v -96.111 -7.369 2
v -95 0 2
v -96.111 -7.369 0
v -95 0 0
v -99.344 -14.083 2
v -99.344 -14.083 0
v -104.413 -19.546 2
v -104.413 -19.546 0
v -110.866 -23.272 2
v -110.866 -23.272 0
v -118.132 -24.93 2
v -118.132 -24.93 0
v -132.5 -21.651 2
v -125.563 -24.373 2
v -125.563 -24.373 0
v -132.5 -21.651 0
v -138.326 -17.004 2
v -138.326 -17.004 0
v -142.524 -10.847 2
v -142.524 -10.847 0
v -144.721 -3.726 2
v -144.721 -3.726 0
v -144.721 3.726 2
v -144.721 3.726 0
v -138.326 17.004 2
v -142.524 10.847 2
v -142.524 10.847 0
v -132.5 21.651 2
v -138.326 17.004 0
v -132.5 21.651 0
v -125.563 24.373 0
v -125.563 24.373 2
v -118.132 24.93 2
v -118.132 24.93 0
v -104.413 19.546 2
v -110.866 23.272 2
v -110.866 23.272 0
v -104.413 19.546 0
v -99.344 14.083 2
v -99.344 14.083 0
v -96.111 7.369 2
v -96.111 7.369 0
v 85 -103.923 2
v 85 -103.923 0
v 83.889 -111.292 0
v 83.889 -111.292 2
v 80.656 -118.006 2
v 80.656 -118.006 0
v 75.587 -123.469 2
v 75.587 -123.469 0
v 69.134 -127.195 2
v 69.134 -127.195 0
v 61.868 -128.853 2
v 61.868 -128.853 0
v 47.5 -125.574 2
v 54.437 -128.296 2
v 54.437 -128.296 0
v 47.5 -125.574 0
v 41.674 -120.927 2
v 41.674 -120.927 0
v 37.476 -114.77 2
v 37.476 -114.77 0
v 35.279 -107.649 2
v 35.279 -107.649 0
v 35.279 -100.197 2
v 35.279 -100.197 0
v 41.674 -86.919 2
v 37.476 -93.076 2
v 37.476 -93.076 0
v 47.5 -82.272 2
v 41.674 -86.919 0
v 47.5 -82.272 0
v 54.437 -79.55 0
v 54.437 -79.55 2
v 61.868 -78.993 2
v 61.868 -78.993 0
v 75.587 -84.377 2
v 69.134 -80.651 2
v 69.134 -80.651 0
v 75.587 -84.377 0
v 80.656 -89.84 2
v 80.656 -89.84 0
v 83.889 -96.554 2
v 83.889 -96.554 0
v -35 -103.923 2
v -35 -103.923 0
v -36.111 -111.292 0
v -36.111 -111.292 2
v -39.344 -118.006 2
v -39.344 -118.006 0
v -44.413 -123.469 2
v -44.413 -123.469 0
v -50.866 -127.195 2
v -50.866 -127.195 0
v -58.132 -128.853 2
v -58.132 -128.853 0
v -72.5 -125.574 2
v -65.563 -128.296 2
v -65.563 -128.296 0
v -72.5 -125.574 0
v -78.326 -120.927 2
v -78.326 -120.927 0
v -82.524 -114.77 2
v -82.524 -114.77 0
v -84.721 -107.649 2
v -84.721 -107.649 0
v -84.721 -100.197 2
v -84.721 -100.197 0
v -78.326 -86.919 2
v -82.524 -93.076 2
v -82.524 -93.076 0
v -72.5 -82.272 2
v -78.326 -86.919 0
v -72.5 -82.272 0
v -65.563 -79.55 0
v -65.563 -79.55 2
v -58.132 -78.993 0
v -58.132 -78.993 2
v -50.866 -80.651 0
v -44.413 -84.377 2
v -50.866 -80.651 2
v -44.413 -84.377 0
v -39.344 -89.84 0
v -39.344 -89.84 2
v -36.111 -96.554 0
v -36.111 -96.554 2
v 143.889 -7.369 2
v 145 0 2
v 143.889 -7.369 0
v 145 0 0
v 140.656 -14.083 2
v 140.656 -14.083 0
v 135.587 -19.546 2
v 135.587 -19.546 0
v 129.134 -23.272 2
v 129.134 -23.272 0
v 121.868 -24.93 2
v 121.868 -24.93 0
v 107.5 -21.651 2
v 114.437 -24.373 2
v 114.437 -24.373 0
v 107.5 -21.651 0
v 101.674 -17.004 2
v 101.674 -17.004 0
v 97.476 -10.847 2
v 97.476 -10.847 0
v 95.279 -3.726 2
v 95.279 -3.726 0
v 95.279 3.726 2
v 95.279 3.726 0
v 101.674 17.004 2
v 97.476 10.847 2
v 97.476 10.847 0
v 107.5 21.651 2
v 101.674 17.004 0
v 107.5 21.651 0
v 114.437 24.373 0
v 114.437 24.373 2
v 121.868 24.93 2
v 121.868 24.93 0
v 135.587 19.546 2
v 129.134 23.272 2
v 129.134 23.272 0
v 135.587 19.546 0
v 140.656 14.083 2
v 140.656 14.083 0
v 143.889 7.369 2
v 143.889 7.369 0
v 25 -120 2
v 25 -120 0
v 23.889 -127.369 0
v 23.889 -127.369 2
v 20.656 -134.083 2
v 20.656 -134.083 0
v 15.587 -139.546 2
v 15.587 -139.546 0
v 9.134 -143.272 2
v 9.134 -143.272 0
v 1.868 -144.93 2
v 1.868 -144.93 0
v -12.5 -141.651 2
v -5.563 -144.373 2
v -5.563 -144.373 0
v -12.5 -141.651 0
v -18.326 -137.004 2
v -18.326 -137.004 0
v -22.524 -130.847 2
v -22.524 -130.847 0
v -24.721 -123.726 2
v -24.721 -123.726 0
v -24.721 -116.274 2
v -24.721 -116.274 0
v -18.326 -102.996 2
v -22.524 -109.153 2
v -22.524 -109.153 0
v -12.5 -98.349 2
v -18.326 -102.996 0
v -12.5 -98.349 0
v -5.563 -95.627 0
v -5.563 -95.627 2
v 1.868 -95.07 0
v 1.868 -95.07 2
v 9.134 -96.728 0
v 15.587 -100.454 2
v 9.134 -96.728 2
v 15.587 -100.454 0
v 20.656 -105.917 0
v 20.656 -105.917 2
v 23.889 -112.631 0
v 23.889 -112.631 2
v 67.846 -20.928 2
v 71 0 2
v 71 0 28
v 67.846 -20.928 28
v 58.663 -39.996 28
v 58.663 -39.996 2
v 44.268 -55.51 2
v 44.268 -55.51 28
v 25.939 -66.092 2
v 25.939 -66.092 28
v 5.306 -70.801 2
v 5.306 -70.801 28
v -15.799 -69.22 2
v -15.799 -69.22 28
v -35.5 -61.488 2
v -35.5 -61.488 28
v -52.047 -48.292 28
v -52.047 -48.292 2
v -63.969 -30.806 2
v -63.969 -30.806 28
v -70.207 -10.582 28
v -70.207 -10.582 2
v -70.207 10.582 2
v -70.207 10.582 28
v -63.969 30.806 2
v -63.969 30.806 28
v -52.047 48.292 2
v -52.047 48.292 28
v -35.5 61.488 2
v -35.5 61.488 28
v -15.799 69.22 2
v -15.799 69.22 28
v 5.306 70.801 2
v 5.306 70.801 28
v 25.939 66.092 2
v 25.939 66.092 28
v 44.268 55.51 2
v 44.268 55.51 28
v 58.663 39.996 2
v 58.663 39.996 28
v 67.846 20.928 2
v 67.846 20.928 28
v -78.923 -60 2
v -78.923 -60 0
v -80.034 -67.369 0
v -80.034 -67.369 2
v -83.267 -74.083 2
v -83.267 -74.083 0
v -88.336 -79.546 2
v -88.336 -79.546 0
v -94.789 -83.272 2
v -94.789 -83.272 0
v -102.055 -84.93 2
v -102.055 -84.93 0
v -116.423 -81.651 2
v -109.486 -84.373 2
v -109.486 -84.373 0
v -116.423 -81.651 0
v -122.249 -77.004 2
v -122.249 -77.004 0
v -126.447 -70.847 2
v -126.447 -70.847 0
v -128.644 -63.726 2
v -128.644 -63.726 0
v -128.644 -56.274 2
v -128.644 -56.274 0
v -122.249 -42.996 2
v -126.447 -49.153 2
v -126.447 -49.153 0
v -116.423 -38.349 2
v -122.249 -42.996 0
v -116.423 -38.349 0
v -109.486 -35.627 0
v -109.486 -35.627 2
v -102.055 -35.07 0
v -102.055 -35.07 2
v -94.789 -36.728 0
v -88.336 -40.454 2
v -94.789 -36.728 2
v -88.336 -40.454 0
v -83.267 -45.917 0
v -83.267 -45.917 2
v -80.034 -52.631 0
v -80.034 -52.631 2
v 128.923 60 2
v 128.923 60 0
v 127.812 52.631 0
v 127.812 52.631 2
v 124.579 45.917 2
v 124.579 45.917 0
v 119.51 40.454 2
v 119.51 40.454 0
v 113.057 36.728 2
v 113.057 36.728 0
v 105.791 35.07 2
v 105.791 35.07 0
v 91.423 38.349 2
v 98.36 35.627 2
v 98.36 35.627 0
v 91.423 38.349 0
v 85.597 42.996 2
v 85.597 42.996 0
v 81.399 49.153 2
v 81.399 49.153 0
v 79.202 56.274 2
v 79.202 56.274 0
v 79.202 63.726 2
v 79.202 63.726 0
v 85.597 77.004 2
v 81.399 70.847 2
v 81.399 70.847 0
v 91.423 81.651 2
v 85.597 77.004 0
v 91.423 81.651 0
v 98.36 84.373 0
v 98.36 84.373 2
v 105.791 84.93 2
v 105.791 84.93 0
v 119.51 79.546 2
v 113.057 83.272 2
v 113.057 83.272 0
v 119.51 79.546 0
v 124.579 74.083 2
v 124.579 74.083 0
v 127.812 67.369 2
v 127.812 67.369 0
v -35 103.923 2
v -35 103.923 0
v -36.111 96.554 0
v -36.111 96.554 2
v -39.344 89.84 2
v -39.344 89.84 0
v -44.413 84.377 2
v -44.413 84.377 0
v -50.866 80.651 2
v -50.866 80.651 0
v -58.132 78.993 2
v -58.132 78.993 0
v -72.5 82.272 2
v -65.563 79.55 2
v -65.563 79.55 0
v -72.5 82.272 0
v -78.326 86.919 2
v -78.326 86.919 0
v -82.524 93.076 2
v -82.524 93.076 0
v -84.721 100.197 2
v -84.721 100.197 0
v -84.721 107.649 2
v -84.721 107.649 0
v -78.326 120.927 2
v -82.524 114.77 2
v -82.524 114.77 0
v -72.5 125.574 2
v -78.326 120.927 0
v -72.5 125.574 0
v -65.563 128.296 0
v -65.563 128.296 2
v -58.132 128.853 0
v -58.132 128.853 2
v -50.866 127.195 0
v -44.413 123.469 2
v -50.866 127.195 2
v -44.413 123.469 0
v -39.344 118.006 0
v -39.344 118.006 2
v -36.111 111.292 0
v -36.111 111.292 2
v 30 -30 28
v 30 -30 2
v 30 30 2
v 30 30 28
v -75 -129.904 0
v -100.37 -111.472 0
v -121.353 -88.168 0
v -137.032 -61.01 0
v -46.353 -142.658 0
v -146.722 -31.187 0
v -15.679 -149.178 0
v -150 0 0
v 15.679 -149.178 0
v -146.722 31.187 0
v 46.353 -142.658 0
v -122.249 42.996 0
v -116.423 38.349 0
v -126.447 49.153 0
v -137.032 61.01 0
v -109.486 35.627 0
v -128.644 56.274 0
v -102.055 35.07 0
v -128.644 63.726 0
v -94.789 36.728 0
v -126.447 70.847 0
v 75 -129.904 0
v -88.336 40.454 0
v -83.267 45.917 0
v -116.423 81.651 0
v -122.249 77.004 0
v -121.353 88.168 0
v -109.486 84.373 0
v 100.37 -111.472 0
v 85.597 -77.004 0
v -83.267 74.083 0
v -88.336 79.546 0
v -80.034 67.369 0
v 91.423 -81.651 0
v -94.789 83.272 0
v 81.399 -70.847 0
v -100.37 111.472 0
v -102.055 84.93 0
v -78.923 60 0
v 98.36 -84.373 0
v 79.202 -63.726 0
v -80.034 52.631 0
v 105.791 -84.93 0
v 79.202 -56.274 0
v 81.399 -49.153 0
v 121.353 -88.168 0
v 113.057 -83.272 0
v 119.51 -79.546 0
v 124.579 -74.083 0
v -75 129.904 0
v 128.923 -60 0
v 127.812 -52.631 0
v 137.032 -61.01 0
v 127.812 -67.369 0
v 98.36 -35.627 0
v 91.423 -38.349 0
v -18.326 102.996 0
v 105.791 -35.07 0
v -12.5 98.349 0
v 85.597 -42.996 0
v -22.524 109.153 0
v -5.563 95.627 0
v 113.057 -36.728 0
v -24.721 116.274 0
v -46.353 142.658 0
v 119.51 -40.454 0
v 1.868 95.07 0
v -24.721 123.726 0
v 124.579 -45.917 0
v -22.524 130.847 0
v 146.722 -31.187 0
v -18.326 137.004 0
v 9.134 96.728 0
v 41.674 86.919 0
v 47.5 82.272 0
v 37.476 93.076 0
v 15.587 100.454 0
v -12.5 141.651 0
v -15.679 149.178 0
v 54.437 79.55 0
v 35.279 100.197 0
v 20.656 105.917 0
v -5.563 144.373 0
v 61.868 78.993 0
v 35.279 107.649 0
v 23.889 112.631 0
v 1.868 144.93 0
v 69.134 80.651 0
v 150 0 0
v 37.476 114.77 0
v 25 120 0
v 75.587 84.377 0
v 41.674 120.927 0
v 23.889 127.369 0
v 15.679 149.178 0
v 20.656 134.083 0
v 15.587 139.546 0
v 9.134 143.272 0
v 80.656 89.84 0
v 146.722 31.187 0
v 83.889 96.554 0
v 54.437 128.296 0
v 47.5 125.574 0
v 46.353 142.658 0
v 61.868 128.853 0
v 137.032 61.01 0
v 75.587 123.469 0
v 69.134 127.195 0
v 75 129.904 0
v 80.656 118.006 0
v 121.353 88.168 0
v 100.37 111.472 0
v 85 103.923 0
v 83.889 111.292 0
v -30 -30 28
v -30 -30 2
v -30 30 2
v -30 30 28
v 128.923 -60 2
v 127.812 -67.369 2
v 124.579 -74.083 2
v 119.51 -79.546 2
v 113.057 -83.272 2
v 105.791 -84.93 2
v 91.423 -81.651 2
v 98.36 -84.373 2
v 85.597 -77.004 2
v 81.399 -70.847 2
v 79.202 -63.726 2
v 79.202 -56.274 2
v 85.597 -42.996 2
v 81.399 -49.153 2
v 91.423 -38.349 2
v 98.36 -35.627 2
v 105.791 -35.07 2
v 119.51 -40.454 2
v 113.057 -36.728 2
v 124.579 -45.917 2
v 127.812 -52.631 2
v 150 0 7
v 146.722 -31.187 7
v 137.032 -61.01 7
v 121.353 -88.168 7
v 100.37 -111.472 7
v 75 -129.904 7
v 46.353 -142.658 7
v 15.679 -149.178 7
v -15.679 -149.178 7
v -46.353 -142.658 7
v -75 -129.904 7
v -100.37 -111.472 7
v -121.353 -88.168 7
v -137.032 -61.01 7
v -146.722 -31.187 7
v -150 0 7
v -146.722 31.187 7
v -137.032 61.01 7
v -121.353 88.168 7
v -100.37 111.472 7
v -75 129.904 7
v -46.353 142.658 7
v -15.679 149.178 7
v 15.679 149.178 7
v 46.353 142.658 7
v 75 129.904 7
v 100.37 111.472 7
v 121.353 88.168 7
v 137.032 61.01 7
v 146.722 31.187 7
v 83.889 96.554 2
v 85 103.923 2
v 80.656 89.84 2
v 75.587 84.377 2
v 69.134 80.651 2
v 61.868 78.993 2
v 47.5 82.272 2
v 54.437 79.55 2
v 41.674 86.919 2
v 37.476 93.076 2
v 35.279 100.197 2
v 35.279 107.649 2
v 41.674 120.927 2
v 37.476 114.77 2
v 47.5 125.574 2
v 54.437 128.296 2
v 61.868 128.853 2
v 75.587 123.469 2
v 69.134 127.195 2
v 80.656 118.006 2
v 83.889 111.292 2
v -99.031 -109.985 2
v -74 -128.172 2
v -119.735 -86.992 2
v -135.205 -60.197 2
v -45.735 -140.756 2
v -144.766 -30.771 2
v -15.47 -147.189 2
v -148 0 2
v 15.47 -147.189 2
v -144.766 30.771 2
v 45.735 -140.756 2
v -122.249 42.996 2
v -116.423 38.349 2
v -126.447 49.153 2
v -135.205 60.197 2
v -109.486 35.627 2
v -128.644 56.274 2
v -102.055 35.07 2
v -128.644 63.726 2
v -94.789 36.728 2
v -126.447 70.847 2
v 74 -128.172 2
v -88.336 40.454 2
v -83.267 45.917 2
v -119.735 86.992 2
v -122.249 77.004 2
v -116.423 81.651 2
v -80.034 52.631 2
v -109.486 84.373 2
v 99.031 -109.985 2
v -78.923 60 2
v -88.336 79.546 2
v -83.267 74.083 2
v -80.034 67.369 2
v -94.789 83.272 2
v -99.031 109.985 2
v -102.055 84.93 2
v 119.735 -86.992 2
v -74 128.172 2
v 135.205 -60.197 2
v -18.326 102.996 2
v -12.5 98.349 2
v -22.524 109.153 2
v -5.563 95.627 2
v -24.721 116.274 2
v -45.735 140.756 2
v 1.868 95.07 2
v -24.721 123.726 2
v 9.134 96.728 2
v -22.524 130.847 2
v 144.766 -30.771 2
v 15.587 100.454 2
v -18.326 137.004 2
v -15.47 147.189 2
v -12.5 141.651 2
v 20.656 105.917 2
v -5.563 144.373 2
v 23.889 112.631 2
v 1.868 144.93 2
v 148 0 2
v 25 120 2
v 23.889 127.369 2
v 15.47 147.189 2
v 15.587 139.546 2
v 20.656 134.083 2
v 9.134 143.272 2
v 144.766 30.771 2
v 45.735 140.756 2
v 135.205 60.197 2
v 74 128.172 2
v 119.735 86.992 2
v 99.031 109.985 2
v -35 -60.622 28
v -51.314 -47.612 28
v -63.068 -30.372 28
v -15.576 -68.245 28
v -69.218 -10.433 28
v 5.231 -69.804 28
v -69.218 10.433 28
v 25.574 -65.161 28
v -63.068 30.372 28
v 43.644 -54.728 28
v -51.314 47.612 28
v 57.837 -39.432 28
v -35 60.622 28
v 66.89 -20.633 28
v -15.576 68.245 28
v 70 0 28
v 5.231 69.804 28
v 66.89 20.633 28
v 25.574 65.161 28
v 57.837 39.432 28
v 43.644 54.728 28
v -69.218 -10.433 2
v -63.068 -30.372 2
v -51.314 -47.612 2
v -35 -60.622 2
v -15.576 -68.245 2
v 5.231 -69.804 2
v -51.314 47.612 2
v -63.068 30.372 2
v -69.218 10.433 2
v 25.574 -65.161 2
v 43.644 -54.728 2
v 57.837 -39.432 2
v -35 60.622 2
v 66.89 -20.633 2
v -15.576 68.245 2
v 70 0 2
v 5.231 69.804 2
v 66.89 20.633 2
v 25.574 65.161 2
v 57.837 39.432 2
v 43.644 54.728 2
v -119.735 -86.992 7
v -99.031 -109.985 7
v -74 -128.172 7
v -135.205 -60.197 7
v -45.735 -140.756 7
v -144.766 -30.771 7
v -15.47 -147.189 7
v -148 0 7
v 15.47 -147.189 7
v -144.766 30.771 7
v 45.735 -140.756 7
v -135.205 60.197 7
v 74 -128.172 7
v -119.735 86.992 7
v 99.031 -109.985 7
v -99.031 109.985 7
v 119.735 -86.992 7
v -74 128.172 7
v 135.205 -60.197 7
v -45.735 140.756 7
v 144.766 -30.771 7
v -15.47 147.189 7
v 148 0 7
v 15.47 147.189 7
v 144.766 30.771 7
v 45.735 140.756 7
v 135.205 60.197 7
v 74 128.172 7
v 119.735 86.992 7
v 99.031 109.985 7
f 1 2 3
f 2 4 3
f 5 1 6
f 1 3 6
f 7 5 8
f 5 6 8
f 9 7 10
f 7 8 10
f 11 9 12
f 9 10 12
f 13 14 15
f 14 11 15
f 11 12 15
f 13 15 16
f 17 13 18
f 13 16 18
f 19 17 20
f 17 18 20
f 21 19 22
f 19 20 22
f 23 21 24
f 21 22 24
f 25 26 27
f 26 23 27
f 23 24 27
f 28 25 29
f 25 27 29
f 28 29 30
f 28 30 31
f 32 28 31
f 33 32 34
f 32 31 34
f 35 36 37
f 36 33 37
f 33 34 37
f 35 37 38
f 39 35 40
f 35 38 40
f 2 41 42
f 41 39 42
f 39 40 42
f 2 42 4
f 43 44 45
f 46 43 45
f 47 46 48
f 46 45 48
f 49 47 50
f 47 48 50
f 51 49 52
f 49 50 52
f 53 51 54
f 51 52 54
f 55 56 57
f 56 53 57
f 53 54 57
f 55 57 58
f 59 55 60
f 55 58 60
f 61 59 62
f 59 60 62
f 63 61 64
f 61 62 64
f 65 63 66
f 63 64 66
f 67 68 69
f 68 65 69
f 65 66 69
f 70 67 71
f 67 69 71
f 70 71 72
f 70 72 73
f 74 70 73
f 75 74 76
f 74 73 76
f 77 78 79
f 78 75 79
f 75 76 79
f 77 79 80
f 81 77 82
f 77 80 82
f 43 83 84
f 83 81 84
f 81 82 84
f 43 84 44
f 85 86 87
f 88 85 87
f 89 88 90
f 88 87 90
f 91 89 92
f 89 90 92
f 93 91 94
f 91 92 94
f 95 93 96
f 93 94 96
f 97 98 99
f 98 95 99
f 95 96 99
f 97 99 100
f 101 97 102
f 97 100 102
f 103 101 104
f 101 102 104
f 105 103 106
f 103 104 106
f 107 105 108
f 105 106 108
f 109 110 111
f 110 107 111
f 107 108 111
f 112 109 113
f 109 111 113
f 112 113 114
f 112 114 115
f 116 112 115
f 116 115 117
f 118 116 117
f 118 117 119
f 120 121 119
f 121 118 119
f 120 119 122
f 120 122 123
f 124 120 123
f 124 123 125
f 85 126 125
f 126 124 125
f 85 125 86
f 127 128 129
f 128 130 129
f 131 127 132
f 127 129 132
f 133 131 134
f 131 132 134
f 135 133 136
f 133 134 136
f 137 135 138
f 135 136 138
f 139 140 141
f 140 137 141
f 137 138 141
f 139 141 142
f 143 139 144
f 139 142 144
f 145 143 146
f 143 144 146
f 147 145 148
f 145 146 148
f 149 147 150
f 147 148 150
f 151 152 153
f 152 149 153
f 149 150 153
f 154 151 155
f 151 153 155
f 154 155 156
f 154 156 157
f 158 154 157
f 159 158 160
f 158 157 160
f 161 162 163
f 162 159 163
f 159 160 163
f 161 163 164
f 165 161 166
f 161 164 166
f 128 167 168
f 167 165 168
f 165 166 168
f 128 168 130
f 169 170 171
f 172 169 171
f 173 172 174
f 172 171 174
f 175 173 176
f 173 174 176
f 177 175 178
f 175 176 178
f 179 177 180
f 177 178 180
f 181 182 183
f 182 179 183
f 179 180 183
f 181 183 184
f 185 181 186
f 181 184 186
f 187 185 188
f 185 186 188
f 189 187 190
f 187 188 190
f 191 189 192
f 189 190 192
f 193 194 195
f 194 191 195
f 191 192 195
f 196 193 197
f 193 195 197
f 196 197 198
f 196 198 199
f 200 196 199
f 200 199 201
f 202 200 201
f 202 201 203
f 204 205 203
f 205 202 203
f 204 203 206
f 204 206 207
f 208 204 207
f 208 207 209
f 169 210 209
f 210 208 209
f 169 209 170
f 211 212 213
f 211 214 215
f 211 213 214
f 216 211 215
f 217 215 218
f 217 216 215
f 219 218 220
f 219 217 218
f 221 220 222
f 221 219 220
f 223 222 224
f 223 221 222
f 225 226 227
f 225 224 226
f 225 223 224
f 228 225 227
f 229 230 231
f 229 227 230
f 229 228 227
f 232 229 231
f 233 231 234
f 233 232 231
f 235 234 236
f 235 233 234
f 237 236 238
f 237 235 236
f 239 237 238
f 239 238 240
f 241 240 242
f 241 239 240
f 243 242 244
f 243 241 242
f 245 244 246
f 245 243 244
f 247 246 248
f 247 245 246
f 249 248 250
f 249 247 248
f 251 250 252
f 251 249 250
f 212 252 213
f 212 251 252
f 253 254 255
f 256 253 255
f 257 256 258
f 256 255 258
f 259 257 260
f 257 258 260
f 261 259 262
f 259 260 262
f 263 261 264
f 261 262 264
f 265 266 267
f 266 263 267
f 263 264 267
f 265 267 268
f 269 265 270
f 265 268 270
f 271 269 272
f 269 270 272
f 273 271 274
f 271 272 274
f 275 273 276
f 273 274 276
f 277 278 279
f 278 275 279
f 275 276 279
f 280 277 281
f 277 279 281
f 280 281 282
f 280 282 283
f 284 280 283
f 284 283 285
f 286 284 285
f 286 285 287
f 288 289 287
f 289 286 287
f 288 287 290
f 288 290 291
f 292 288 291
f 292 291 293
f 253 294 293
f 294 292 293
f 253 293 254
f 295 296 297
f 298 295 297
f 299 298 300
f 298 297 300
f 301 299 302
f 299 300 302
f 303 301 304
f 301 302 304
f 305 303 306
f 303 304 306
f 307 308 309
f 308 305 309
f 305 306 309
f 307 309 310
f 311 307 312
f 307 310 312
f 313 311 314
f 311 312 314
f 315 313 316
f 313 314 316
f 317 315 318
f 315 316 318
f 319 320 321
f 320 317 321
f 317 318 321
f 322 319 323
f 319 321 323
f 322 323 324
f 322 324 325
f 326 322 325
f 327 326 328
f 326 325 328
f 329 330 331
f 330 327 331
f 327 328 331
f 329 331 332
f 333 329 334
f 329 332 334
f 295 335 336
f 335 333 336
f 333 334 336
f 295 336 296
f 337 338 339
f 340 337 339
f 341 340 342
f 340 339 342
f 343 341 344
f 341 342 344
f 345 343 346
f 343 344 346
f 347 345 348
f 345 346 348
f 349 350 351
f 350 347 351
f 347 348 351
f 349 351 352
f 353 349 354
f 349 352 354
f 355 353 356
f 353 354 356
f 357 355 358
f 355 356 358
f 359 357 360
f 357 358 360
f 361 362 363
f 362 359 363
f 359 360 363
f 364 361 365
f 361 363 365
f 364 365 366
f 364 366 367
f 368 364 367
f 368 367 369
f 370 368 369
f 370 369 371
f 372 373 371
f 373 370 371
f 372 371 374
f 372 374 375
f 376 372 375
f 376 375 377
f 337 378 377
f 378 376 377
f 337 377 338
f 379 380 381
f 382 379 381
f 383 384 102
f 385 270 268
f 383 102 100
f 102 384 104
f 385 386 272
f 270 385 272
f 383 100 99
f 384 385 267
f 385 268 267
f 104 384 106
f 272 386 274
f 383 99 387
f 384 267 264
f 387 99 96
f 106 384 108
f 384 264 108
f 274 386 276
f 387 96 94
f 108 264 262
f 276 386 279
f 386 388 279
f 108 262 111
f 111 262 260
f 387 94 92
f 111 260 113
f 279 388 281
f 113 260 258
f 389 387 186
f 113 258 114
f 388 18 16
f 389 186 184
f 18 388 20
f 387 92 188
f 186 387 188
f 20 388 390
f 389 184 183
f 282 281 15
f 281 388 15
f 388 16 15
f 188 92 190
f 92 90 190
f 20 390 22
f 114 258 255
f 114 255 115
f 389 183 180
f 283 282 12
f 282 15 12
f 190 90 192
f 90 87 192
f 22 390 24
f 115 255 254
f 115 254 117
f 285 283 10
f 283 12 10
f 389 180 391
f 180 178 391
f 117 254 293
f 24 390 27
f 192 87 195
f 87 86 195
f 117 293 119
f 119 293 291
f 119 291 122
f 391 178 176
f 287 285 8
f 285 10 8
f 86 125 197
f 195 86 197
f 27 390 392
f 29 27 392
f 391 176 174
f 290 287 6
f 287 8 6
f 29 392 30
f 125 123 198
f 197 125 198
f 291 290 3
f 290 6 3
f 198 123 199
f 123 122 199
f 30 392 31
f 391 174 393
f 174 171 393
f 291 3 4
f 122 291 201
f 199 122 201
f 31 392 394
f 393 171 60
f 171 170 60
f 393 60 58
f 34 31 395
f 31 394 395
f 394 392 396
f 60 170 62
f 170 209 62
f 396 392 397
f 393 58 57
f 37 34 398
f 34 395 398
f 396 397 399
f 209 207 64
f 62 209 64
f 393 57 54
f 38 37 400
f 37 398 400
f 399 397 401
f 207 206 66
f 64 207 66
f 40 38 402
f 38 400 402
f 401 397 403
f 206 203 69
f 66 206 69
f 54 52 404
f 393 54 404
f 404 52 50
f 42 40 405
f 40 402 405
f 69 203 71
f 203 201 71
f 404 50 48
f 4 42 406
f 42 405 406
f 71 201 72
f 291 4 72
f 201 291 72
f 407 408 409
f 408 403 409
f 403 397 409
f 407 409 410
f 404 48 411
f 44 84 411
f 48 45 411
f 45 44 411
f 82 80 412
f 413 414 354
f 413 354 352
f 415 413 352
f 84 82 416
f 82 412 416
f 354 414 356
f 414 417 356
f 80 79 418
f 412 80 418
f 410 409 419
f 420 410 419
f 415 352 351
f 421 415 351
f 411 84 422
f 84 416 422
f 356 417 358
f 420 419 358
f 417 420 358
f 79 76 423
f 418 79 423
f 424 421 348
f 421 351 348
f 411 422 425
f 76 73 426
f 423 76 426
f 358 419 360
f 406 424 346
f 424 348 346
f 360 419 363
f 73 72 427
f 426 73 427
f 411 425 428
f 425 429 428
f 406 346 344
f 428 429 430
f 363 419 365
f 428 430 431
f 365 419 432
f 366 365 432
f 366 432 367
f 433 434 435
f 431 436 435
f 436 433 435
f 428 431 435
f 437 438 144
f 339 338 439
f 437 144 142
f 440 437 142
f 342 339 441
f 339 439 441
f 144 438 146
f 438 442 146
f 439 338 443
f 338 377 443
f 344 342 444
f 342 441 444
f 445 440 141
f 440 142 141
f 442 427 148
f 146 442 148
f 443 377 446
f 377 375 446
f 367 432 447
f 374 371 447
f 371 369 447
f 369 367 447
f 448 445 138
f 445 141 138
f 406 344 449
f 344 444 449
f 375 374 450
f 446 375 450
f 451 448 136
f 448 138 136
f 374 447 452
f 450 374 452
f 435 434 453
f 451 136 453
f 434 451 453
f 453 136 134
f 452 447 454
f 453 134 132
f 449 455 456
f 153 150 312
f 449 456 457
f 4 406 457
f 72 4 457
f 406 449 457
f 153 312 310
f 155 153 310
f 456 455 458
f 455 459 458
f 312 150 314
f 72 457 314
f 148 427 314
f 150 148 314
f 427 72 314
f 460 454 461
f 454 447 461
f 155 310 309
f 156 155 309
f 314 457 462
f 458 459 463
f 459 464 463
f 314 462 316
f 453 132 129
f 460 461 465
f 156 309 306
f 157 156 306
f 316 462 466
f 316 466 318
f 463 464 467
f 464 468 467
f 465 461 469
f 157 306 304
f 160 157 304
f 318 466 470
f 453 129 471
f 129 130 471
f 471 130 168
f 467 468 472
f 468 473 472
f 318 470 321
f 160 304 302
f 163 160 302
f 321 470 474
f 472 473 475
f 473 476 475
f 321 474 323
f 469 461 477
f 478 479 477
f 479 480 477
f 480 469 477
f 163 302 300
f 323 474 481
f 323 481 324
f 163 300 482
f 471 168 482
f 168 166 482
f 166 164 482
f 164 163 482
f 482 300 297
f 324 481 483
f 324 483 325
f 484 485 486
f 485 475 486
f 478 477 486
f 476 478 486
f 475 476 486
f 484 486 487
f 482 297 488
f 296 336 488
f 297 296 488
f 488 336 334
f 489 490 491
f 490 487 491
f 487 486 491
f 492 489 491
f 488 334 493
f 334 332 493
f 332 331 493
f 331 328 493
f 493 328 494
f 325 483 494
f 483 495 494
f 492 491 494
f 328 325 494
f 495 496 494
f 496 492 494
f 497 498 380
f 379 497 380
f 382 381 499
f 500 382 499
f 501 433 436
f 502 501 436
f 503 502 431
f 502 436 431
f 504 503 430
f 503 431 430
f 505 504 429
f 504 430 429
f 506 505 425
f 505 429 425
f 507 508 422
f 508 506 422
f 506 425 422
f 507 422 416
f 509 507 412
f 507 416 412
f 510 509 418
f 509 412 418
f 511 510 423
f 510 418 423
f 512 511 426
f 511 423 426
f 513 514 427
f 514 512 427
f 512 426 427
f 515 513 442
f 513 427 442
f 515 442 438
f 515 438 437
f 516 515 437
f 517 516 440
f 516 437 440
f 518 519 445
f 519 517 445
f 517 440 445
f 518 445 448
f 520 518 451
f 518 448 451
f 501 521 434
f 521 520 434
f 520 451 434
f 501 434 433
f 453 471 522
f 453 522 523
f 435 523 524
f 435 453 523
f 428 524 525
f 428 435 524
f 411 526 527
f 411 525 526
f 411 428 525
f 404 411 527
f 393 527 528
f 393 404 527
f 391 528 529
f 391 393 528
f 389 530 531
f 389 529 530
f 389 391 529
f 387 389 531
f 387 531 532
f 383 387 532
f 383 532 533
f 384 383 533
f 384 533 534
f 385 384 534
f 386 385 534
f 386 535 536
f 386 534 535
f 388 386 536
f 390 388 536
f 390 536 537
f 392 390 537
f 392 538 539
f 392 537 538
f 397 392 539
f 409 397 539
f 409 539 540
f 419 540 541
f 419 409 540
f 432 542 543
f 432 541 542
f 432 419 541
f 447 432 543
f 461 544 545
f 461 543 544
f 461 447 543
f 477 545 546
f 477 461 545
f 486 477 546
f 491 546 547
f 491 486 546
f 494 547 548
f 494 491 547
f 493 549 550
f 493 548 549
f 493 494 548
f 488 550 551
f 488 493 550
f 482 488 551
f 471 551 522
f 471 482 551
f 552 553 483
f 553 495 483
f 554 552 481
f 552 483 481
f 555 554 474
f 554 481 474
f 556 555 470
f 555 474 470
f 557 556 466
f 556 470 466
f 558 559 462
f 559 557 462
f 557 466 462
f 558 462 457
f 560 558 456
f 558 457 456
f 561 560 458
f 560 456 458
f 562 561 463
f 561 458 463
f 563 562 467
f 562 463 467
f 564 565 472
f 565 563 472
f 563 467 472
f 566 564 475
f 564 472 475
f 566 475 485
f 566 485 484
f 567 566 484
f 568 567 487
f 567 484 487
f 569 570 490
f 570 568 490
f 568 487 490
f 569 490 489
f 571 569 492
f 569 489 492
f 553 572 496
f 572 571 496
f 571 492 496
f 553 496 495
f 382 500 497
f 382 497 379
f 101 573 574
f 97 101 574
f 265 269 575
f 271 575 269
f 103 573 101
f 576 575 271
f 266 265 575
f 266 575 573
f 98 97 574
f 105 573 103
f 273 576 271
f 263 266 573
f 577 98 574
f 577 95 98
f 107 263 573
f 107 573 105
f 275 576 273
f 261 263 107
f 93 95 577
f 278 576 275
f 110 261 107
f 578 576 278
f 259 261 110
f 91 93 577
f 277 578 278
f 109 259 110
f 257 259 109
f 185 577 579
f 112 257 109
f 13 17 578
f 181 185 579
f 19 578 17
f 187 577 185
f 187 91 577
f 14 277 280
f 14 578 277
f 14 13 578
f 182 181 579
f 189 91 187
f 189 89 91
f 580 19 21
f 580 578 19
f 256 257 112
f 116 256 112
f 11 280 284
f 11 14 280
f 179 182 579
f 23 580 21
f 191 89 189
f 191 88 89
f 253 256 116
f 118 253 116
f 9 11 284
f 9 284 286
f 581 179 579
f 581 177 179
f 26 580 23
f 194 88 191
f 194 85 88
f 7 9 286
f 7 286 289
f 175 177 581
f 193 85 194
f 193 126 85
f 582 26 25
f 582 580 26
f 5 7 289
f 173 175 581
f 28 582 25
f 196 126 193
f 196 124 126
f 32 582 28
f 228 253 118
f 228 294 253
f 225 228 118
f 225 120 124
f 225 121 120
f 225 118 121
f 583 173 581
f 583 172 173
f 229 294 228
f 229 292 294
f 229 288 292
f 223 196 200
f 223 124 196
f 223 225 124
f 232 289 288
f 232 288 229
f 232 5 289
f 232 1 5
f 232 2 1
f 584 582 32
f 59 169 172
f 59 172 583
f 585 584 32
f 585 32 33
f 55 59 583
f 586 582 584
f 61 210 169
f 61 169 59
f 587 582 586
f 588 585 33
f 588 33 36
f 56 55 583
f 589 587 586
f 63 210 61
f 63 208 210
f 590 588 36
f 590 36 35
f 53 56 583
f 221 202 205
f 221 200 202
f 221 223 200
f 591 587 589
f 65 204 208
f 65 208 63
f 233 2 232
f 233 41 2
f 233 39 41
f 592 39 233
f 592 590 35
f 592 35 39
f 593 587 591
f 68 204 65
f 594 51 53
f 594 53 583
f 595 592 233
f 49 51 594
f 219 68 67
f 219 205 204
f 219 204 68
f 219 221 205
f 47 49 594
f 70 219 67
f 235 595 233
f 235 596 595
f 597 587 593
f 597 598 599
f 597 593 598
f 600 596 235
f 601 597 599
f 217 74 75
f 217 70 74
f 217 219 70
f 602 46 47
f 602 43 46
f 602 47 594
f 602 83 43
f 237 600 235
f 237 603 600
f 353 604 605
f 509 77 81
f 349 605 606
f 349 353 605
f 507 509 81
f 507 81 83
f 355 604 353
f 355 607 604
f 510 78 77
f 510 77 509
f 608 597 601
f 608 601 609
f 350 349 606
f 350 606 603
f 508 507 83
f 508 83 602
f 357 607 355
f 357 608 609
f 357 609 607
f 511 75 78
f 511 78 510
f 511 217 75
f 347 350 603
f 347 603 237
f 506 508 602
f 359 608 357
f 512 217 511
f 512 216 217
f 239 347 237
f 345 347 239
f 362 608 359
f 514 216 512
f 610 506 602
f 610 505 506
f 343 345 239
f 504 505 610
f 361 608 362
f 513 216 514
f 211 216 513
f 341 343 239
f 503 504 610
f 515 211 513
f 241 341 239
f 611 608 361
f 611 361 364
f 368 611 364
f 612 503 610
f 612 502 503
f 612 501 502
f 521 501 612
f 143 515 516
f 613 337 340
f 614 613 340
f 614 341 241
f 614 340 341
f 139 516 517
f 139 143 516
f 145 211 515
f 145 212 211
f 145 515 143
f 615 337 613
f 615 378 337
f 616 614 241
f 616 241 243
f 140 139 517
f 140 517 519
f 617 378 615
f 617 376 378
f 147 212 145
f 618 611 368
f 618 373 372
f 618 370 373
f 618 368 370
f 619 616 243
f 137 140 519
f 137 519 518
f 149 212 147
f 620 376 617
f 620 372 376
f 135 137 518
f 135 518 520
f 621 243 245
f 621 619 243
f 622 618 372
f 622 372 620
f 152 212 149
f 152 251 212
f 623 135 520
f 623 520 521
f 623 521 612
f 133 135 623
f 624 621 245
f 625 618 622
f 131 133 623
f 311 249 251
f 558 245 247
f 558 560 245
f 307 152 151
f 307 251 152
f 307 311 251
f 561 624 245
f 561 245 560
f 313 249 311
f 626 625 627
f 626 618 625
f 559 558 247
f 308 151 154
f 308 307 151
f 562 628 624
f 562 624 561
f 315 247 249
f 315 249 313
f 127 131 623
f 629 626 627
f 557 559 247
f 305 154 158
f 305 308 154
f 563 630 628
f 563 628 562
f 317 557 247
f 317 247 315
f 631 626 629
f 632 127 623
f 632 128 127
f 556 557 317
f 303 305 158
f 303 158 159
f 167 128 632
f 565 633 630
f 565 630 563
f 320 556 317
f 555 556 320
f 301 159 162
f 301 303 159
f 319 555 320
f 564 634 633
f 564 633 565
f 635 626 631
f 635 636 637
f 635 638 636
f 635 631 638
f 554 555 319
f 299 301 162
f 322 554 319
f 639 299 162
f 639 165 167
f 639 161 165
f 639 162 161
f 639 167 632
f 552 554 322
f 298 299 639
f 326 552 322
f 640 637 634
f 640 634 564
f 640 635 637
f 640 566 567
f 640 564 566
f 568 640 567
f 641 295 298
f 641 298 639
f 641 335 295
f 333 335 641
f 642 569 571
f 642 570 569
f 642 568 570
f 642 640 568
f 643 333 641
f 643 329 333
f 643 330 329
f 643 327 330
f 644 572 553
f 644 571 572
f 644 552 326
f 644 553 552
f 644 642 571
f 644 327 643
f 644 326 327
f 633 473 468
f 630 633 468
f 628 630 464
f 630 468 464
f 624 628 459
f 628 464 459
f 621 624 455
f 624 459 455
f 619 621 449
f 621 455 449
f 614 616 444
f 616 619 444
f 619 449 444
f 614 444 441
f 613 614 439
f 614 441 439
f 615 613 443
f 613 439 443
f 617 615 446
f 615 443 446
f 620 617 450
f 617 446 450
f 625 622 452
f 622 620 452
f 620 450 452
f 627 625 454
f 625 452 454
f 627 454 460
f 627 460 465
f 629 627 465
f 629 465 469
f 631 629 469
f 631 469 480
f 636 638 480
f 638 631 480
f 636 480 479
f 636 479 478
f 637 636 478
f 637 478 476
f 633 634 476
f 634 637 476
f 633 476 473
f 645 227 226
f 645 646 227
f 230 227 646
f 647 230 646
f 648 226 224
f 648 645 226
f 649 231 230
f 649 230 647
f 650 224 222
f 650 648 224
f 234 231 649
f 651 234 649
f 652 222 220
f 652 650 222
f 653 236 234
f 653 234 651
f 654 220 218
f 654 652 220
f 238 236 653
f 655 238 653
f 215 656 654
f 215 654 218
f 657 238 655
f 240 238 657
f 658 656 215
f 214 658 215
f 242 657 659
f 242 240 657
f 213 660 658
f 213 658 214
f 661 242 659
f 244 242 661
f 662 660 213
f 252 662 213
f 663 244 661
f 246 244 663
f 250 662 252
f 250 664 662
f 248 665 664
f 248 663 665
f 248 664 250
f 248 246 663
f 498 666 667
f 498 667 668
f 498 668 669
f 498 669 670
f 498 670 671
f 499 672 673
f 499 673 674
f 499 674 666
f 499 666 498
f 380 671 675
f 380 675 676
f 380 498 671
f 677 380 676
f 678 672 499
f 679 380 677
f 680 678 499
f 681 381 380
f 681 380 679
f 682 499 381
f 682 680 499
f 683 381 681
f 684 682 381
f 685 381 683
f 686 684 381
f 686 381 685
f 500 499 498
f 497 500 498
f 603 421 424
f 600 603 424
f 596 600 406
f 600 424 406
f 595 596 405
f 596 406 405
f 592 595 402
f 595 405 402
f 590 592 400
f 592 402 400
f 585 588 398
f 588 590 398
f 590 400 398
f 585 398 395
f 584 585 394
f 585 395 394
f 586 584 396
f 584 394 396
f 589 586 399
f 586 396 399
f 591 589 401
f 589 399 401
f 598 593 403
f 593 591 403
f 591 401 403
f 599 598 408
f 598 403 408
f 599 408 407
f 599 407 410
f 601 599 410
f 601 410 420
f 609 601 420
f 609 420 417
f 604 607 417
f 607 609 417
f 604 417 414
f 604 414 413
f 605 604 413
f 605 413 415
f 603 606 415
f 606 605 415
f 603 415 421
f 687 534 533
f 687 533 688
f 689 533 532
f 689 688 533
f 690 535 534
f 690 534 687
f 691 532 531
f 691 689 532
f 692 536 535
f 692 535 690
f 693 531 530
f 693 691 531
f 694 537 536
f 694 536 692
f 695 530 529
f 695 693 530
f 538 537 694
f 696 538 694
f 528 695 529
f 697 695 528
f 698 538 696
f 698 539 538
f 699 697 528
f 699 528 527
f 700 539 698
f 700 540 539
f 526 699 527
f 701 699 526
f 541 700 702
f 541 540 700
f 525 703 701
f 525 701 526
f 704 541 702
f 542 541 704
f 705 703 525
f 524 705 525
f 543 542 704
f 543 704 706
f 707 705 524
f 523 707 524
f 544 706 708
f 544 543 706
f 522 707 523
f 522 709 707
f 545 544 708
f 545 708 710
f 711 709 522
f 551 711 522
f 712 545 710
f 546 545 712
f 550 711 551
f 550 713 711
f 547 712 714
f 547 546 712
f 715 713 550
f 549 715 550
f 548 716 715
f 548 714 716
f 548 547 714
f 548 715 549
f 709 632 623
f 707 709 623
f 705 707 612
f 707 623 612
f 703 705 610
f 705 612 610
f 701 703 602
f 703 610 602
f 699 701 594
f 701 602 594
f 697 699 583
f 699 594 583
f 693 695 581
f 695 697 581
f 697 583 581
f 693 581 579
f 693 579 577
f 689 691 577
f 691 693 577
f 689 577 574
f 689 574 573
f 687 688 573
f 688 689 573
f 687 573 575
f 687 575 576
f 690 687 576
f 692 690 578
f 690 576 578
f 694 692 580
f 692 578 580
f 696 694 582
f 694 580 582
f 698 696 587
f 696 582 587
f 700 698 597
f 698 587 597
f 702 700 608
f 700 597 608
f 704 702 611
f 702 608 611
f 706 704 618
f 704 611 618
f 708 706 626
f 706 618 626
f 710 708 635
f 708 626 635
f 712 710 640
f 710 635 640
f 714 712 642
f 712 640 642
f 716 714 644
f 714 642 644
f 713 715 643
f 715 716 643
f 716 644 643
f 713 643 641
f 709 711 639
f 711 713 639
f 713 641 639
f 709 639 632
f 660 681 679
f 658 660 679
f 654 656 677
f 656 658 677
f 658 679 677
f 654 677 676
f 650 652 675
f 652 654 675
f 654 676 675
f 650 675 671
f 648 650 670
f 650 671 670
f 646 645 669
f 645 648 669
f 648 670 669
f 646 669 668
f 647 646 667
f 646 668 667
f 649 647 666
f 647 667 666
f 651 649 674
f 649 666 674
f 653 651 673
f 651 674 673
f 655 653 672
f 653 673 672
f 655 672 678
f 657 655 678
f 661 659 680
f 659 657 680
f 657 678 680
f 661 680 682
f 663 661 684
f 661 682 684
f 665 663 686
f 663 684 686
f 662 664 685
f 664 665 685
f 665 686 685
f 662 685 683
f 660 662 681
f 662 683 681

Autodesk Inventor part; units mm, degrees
ref_plane "YZ Plane" through (0, 0, 0) normal (1, 0, 0) x (0, 1, 0)
ref_plane "XZ Plane" through (0, 0, 0) normal (0, 1, 0) x (-1, 0, 0)
ref_plane "XY Plane" through (0, 0, 0) normal (0, 0, 1) x (1, 0, 0)
sketch "Sketch1" plane through (0, 0, 0) normal (0, 0, 1) x (1, 0, 0)
  circle A0 centre (0, 0) radius 150
  circle A1 centre (0, 120) radius 25
  circle A2 centre (60, 103.923) radius 25
  circle A3 centre (103.923, 60) radius 25
  circle A4 centre (120, 0) radius 25
  circle A5 centre (103.923, -60) radius 25
  circle A6 centre (60, -103.923) radius 25
  circle A7 centre (0, -120) radius 25
  circle A8 centre (-60, -103.923) radius 25
  circle A9 centre (-103.923, -60) radius 25
  circle A10 centre (-120, 0) radius 25
  circle A11 centre (-103.923, 60) radius 25
  circle A12 centre (-60, 103.923) radius 25
  dimension "d0" = 300
  dimension "d1" = 50
  dimension "d2" = 0
  dimension "d3" = 120
  dimension "d6" = 360
extrude "Extrusion1" add sketch "Sketch1" along normal blind 2
sketch "Sketch2" plane through (0, 0, 2) normal (0, 0, 1) x (1, 0, 0)
  circle A0 centre (0, 0) radius 150 projected
  circle A1 centre (0, 0) radius 148
  dimension "d10" = 2
extrude "Extrusion2" add sketch "Sketch2" along normal blind 5
sketch "Sketch3" plane through (0, 0, 2) normal (0, 0, 1) x (1, 0, 0)
  circle A0 centre (0, 0) radius 71
  circle A1 centre (0, 0) radius 70
  line L0 (30, 30) -> (-30, 30)
  line L1 (-30, 30) -> (-30, -30)
  line L2 (-30, -30) -> (30, -30)
  line L3 (30, -30) -> (30, 30)
  line L4 (30, 30) -> (-30, -30) construction
  line L5 (-30, 30) -> (30, -30) construction
  dimension "d13" = 142
  dimension "d14" = 1
  dimension "d17" = 60
  dimension "d18" = 60
extrude "Extrusion3" add sketch "Sketch3" along normal blind 26
sketch "Sketch4" plane through (0, 0, 0) normal (0, 0, 1) x (1, 0, 0)
  point P0 (0, 0)
sketch "Sketch5" plane through (0, 0, 0) normal (0, 0, -1) x (-1, 0, 0)
  line L0 (-191.5583, 191.5583) -> (190.3872, 191.5583) construction
  line L1 (190.3872, 191.5583) -> (190.3872, -190.3872) construction
  line L2 (190.3872, -190.3872) -> (-191.5583, -190.3872) construction
  line L3 (-191.5583, -190.3872) -> (-191.5583, 191.5583) construction
  point P0 (0, 0)
properties part number "Clock"
